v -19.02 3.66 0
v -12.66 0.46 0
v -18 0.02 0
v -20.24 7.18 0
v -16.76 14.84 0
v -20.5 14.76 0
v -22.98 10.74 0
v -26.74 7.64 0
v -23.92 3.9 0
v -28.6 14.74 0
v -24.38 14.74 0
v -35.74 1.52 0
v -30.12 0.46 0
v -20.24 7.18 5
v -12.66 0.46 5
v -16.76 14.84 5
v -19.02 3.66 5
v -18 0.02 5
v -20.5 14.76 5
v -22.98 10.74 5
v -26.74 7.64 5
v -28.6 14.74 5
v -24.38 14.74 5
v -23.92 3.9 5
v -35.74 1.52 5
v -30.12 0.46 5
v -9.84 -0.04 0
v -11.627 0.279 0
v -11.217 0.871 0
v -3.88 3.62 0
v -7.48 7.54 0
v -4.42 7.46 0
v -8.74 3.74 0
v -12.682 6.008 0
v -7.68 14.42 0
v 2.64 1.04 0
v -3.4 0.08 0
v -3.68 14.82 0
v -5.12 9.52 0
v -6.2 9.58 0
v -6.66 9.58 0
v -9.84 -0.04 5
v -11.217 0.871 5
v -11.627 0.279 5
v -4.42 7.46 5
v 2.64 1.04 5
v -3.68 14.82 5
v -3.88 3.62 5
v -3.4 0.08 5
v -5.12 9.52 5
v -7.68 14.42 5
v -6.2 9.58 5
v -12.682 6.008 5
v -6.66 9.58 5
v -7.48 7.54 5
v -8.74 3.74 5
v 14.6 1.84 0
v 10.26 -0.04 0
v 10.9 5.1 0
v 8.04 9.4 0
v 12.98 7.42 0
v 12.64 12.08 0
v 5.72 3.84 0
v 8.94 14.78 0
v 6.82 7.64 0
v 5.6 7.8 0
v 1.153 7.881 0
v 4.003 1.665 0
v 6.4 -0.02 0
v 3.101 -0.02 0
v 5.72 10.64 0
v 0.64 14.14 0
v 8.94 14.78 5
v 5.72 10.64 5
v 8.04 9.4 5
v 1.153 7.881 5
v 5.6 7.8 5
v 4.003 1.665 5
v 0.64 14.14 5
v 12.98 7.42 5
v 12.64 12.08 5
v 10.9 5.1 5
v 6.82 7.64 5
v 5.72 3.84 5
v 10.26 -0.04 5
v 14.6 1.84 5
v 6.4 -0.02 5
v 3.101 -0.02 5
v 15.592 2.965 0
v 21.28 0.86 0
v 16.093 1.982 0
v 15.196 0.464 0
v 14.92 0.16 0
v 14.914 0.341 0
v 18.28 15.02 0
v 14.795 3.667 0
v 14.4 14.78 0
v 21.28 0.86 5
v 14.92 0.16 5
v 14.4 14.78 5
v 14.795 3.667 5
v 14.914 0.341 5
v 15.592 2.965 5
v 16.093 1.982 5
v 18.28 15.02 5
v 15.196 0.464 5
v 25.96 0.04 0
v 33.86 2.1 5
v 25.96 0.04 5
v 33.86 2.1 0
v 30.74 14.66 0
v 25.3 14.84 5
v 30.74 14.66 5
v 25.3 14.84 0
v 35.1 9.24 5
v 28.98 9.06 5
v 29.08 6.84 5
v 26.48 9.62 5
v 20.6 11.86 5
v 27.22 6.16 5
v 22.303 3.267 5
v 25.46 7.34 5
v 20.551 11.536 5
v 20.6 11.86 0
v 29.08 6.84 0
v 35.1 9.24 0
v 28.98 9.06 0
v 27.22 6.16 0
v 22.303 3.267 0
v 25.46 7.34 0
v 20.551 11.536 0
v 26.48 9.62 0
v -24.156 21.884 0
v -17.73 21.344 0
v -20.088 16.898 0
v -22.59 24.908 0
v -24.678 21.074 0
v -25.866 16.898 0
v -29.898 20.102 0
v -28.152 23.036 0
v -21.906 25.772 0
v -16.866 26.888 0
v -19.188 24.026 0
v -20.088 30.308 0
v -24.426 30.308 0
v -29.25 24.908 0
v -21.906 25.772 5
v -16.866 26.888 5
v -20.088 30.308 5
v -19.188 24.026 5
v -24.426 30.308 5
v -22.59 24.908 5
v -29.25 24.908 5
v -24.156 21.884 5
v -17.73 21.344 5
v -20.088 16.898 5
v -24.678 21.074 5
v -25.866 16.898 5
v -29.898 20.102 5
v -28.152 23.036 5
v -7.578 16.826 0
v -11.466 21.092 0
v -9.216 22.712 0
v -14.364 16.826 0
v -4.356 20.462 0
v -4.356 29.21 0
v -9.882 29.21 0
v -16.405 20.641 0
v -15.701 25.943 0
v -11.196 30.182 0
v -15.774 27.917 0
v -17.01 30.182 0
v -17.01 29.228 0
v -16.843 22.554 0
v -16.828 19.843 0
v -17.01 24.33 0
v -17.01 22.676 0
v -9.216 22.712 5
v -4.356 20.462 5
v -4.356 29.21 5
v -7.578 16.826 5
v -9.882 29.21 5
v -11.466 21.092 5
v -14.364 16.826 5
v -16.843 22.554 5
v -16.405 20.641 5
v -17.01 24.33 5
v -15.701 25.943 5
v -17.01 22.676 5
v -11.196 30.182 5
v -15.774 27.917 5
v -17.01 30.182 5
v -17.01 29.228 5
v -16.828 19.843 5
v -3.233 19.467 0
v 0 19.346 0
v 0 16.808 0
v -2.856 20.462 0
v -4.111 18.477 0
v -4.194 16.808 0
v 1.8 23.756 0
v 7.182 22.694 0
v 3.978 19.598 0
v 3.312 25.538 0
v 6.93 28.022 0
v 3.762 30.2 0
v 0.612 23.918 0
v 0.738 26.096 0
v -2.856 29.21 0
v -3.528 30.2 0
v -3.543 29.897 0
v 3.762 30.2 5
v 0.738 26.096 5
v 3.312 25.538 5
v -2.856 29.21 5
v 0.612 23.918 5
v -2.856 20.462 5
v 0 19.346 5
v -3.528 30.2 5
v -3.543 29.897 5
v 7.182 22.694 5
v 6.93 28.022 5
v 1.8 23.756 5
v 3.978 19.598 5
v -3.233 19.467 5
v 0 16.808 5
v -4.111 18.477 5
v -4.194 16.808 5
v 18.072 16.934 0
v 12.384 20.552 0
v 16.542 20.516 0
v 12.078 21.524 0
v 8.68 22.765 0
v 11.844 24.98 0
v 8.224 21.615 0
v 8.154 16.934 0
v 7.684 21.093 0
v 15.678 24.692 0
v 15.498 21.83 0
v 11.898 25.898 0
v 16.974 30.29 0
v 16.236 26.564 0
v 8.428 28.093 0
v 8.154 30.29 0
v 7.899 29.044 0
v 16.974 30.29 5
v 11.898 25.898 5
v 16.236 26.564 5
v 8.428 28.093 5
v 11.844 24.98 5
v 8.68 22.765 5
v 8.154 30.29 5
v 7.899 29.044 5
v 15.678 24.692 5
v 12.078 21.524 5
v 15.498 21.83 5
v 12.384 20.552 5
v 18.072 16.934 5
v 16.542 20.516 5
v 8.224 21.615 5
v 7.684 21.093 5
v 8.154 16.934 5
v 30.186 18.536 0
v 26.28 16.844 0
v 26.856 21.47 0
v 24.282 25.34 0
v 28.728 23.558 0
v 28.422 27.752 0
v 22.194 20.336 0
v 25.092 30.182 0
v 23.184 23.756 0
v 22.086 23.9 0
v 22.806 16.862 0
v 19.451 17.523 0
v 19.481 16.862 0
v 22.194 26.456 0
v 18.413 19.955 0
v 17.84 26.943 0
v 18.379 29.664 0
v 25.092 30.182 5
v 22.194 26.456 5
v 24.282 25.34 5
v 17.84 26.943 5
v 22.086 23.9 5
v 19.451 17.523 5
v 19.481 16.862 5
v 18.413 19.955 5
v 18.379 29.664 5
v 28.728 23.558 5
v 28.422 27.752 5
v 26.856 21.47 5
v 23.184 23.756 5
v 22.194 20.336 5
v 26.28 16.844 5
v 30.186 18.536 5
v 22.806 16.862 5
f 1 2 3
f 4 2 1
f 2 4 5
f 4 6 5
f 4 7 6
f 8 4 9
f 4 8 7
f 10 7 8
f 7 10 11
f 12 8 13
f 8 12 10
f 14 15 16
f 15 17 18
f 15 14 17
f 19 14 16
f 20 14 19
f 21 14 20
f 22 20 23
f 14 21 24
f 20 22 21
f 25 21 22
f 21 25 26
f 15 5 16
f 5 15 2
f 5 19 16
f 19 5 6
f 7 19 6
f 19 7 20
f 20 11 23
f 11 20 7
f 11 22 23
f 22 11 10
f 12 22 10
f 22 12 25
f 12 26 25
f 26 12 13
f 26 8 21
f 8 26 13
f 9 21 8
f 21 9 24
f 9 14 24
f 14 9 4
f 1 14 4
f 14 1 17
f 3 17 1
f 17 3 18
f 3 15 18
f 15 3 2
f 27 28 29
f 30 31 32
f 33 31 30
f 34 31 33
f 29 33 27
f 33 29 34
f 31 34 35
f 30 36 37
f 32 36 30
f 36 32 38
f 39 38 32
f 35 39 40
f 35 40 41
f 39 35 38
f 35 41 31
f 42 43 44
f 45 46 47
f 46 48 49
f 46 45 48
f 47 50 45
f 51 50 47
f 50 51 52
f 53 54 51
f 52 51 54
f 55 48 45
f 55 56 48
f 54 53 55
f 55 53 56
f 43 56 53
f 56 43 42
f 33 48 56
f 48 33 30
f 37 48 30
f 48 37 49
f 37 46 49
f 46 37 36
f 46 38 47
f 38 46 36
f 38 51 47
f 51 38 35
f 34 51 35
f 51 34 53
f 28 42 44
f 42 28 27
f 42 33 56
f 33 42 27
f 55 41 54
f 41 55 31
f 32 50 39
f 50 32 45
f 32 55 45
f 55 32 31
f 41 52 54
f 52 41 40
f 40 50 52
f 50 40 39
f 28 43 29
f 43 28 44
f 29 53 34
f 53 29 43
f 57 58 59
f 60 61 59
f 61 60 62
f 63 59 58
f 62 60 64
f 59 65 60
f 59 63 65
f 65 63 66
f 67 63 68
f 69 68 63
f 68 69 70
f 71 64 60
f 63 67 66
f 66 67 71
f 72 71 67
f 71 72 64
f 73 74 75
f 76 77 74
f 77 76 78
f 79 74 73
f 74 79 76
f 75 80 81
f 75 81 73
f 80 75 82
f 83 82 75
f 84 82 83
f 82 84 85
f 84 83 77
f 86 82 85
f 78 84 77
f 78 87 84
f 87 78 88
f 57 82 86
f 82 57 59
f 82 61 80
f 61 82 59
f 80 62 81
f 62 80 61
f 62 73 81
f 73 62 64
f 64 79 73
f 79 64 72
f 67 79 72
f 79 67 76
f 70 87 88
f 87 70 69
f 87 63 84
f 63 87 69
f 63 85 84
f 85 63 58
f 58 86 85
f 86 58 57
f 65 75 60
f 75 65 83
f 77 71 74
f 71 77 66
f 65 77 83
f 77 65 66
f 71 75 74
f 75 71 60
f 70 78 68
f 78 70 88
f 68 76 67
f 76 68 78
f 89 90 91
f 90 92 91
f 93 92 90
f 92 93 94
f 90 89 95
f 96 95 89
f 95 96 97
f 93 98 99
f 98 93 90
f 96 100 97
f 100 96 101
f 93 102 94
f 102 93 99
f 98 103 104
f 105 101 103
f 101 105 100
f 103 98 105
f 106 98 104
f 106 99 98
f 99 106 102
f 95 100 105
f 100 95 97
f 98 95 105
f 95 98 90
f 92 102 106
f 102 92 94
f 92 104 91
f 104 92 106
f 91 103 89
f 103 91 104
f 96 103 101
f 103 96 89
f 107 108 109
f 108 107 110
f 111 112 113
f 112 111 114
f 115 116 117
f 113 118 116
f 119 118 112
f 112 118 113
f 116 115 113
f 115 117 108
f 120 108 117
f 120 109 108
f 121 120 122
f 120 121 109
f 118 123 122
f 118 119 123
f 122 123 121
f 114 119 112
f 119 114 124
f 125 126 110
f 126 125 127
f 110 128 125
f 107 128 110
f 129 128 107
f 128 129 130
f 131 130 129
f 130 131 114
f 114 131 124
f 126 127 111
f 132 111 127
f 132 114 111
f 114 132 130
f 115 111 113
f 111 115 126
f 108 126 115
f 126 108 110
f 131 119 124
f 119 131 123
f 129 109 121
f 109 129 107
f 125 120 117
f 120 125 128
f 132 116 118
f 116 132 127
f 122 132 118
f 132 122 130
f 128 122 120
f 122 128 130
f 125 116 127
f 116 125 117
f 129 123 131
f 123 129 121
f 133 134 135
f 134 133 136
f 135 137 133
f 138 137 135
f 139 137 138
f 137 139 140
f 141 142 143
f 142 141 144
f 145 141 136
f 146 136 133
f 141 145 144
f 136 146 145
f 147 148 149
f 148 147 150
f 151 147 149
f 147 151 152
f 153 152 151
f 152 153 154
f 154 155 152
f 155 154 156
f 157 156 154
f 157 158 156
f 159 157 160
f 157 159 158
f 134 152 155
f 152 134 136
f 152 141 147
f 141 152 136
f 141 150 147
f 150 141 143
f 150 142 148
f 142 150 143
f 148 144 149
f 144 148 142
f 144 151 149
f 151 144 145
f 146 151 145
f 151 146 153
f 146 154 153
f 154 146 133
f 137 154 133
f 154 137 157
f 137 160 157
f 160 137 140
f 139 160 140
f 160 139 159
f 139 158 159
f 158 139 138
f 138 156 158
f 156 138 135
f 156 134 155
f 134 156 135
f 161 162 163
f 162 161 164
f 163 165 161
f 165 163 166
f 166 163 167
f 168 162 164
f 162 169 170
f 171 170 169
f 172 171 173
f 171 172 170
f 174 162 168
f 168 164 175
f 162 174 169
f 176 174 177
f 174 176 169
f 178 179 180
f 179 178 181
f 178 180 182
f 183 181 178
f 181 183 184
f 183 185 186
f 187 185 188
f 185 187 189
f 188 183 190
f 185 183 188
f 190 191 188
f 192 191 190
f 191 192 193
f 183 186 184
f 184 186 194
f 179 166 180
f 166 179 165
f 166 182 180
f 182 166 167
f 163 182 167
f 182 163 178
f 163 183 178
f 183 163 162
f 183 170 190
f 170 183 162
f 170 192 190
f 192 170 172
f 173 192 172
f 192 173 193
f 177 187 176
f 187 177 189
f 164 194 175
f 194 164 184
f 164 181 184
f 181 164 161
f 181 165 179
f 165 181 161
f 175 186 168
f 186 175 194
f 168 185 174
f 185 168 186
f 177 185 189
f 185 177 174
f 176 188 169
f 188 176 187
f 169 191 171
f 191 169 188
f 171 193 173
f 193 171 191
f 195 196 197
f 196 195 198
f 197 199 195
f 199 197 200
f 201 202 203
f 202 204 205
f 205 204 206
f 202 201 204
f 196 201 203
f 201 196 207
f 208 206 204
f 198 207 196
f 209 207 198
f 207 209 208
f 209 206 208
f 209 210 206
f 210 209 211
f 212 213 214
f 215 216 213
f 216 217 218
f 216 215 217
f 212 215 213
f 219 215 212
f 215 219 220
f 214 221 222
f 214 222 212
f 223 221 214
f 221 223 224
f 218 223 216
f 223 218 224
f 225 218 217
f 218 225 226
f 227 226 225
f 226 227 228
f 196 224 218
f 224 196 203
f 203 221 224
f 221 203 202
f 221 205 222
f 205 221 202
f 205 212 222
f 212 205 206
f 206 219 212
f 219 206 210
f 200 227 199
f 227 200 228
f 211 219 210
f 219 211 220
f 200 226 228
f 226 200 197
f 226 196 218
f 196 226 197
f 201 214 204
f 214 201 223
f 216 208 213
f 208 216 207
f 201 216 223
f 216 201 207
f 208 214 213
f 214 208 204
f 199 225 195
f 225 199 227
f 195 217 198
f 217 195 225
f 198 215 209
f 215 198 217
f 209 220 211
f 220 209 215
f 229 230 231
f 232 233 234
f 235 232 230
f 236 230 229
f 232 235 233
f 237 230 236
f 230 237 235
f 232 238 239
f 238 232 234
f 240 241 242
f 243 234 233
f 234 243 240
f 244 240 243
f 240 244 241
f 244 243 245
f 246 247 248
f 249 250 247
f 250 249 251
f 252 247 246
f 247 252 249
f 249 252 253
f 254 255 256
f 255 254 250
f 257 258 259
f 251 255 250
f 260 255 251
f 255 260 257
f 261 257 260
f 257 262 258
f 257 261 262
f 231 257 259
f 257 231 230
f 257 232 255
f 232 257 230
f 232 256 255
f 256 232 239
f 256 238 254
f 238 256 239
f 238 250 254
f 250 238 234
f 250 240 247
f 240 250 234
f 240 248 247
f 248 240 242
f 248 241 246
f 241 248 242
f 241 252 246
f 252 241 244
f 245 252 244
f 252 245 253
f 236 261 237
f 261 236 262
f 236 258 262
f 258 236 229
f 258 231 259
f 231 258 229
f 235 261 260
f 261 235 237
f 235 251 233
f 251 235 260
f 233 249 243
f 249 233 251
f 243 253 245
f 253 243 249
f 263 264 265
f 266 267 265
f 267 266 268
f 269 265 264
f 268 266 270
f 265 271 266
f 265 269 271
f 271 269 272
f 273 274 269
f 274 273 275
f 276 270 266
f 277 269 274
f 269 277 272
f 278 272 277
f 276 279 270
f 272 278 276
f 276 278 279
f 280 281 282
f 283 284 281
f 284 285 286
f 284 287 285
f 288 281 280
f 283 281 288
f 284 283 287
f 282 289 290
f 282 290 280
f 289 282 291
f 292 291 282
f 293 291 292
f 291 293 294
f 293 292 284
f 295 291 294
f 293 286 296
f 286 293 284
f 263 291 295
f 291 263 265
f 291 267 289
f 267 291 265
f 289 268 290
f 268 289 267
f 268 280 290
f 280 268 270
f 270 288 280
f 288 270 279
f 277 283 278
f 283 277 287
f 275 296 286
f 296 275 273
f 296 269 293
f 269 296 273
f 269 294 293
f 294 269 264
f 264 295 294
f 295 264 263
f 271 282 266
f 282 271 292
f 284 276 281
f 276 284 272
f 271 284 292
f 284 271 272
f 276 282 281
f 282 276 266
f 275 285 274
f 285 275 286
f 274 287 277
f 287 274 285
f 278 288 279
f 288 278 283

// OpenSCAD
// Choose your custom words and write them in UPPERCASE.
// If you want only one line, you can leave the second word empty.
word1="SUPER";
word2="MARIO";

// CONSTANTS
// The following values are model constants and are not intended to be changed by the end user.
//-----------------
// [Fixed design parameters]
// Scale for Word 1
scale_word1 = 1.8;

// Scale for Word 2
scale_word2 = 2.0;
// Height scale
scale_height = 5;

// Brim radius/offset
brim_radius = 1.5;

// Gap between the two words
gap = 2;
// Spaziatura tra le lettere
spacing = 0.0;
// Thickness of the brim base
bottom_thickness=2;

// Small tolerance to help letters fit into the brim
wiggle=0.1;
//-----------------


// Wall thickness for hollow letters
wall_thikness_letter = 2;

//-----------------

// Path data for letters and symbols
glyph_A = [
    [449, 741], [765, 52], [463, 4], [439, 181], [196, 187], [141, -2], [-150, 50], [249, 721], [449, 741]
]/100;
glyph_B = [
    [138, 747], [485, 706], [565, 578], [559, 441], [507, 363], [580, 321], [629, 178], [573, 45], [457, 4], [21, 1], [1, 704], [138, 747]
]/100;
glyph_C = [
    [287, 744], [563, 726], [552, 461], [372, 545], [215, 472], [208, 302], [346, 208], [549, 314], [617, 35], [218, 0], [23, 171], [-35, 386], [55, 617], [287, 744]
]/100;
glyph_D = [
    [368, 744], [578, 572], [621, 171], [414, 2], [0, 2], [0, 699], [368, 744]
]/100;
glyph_E = [
    [54, 745], [544, 745], [503, 538], [262, 501], [259, 450], [472, 434], 
    [462, 275], [272, 258], [289, 204], [520, 202], [605, 3], [54, 3], 
    [0, 481], [54, 745]
]/100;
glyph_F = [
    [49, 746], [553, 742], [525, 501], [250, 532], [246, 452], [479, 464], [441, 244], [246, 269], [288, 3], [22, 3], [1, 543], [49, 746]
]/100;
glyph_G = [
    [627, 591], [456, 495], [387, 533], [285, 502], [224, 357], [288, 222], [472, 244], [476, 277], [334, 264], [352, 465], [648, 461], [648, 66], [151, 2], [0, 309], [55, 591], [267, 745], [527, 727], [627, 591]
]/100;
glyph_H = [
    [0, 698], [252, 746], [264, 441], [411, 463], [420, 732], [626, 723], [666, 5], [434, 13], [432, 238], [292, 211], [297, 5], [80, 5],
    [0, 698]
]/100;
glyph_I = [
    [5, 739], [199, 751], [349, 43], [31, 8], [5, 739]
]/100;
glyph_J = [
    [0, 739], [219, 744], [658, 724], [658, 528], [459, 509],
    [533, 162], [430, 32], [235, 0], [18, 0], [25, 220],
    [263, 237], [236, 509], [0, 528], [0, 739]
]/100;
glyph_K = [
    [14, 741], [223, 741], [218, 539], [375, 718], [518, 566],
    [337, 369], [605, 178], [440, 0], [216, 243], [257, -2],
    [0, -2], [14, 741]
]/100;
glyph_L = [
    [278, 717], [249, 269], [556, 306], [584, 75], [28, 9],
    [0, 749], [278, 717]
]/100;
glyph_M = [
    [0, 76], [357, 737], [568, 737], [638, 537], [762, 738],
    [949, 742], [1154, 23], [887, 1], [836, 183], [775, 359],
    [591, 195], [450, 382], [281, 23], [0, 76]
]/100;
glyph_N = [
    [0, 13], [133, 742], [284, 742], [425, 510], [437, 742],
    [669, 706], [620, 4], [428, 16], [280, 242], [237, 3],
    [0, 13]
]/100;
glyph_O = [
    [522, 733], [740, 462], [678, 105], [283, 2], [-32, 280],
    [15, 593], [250, 742], [522, 733]
]/100;
glyph_P = [
    [442, 740], [618, 619], [632, 323], [454, 151], [233, 137], [233, -4], [0, -4], [37, 740], [442, 740]
]/100;
glyph_Q =[
    [531, 731], [721, 478], [653, 216], [797, 84], [621, -2], [535, 61], [238, -3], [-21, 243], [26, 593], [260, 740], [531, 731]
]/100;
glyph_R = [
    [415, 739], [600, 604], [617, 371], [513, 255], [698, 92], [481, -2], [254, 192], [288, -1], [58, -1], [0, 707], [415, 739]
]/100;
glyph_S = [
    [725, 556], [596, 397], [445, 494], [407, 446], [677, 248], [546, 1], [225, 1], [1, 179], [98, 342], [291, 233],
    [320, 278], [37, 446], [305, 746], [546, 746], [725, 556]
]/100;
glyph_T = [
    [0, 742], [739, 729], [739, 429], [489, 470], [558, -1], [200, -1], [254, 470], [0, 483], [0, 742]
]/100;
glyph_U = [
    [-9, 739], [314, 739], [299, 234], [424, 324], [387, 685], [694, 685], [694, 199], [515, -3], [138, -3], [-9, 177], [-9, 739]
]/100;
glyph_V = [
    [0, 745], [259, 731], [362, 284], [401, 334], [512, 731], [799, 745], [517, 3], [169, 29], [0, 745]
]/100;
glyph_W = [
    [1028, 675], [709, 6], [523, 6], [454, 207], [352, 5], [182, 0], [0, 723], [238, 744], [283, 562], [337, 385], [502, 550], [627, 362], [778, 729], [1028, 675]
]/100;
glyph_X = [
    [200, 739], [357, 579], [473, 750], [663, 568], [525, 405], [753, 226], [563, 7], [399, 221], [191, 12], [0, 201], [221, 400], [53, 588], [200, 739]
]/100;
glyph_Y = [
    [71, 733], [236, 557], [391, 753], [610, 588], [371, 380], [548, 13], [156, 31], [156, 350], [-93, 588], [71, 733]
]/100;
glyph_Z = [
    [617, 3], [0, 28], [0, 228], [248, 486], [0, 471], [44, 748], [625, 707], [614, 517], [386, 265], [625, 300], [617, 3]
]/100;
glyph_0 = [
    [381, 732], [552, 531], [497, 90], [224, 1], [3, 223], [48, 606], [202, 742], [381, 732], [560, 732]
]/100;
glyph_1 = [
    [527, 727], [468, 205], [679, 232], [713, 1], [0, 1], [20, 218], [258, 205], [258, 476], [133, 397], [0, 578], [269, 741], [527, 741]
]/100;
glyph_2 = [
    [4, 605], [211, 742], [392, 741], [544, 629], [610, 352], [411, 221], [629, 239], [686, 1], [110, 9], [34, 156], [330, 390], [309, 454], [261, 492], [140, 409], [4, 605]
]/100;
glyph_3 = [
    [1, 607], [178, 740], [403, 708], [511, 522], [441, 421], [528, 357], [534, 131], [415, 1], [148, 26], [1, 175], [120, 291], [220, 197], [314, 222], [317, 279], [170, 329], [176, 419], [295, 498], [264, 531], [97, 454], [1, 607]
]/100;
glyph_4 = [
    [531, 409], [689, 402], [689, 223], [548, 214], [575, 31], [318, 4], [314, 214], [8, 214], [4, 400], [208, 747], [487, 728], [531, 409]
]/100;
glyph_5 = [
    [572, 741], [530, 543], [247, 546], [253, 501], [415, 495], [610, 389], [609, 166], [534, 45], [189, 10], [7, 95], [88, 248], [212, 205], [324, 200], [368, 251], [318, 298], [91, 293], [10, 433], [0, 724], [572, 741]
]/100;
glyph_6 = [
    [154, 719], [335, 746], [515, 709], [447, 499], [286, 559], [211, 500], [202, 444], [416, 438], [501, 300], [499, 120], [380, 1], [136, 1], [0, 120], [0, 371], [28, 575], [154, 719]
]/100;
glyph_7 = [
    [0, 740], [641, 726], [524, -3], [234, 66], [393, 501], [51, 473], [0, 740]
]/100;
glyph_8 = [
    [461, 716], [533, 519], [446, 450], [562, 355], [577, 61], [414, -3], [154, -3], [0, 87], [17, 351], [139, 444], [46, 519], [116, 745], [461, 716]
]/100;
glyph_9 = [
    [306, 747], [533, 593], [524, 320], [447, 127], [116, 1], [0, 161], [264, 230], [319, 327], [137, 313], [0, 463], [36, 677], [306, 747]
]/100;
glyph_at = [
    [422, 103], [606, 184], [657, 125], [441, 2], [160, 63], [3, 349], [116, 715], [381, 854], [786, 684], [869, 344], [800, 248], [744, 167], [636, 182], [594, 233], [461, 169], [234, 206], [183, 482], [323, 672], [510, 664], [596, 607], [599, 637], [670, 600], [653, 418], [677, 260], [722, 243], [783, 364], [710, 615], [385, 748], [197, 637], [119, 371], [212, 165], [422, 103]
]/100;
glyph_b_l = [
    [233, 856], [241, 782], [89, 795], [84, -15], [241, 15], [241, -83], [7, -98], [2, 866], [233, 856]
]/100;
glyph_b_r = [
    [9, -88], [1, -14], [153, -27], [158, 783], [1, 753], [1, 851], [235, 866], [240, -98], [9, -88]
]/100;
glyph_per = [
    [389, 745], [572, 774], [206, 33], [0, 4], [389, 745], [475, 293], [544, 213], [522, 35], [412, 0], [324, 88], [342, 242], [404, 297], [475, 293], [389, 745], [191, 768], [260, 687], [238, 510], [128, 474], [38, 564], [57, 717], [119, 771], [191, 768], [389, 745]
]/100;
glyph_num = [
    [395, 778], [292, 29], [156, 0], [274, 749], [395, 778],
    
    [544, 749], [665, 778], [563, 29], [426, 0], [544, 749], 
    
   [718, 601], [810, 451], [113, 429], [4, 594], [718, 601],  
    
    [733, 328], [832, 169], [135, 147], [60, 316], [733, 328], [718, 601], [544, 749], [395, 778]
]/100;
glyph_dol = [
    [664, 550], [546, 405], [431, 528], [289, 576], [254, 531], [664, 256], [500, 42], [206, 42], [1, 205], [90, 354], [259, 208], [444, 163], [471, 204], [34, 450], [279, 724], [500, 724], 
    [424, 794], [341, 795], [283, -32], [399, -20], [424, 794], [500, 724]
]/100;
glyph_asc = [
    [278, 582], [164, 765], [68, 601], [8, 638], [164, 882], [348, 593], [278, 582]
]/100;
glyph_bar = [
    [60, -121], [5, -121], [3, 853], [58, 853], [60, 974], [115, 974], [60, -121]
]/100;
glyph_ast = [
    [67, 719], [97, 720], [93, 653], [144, 696], [158, 662], [99, 638], [161, 608], [141, 585], [93, 620], [99, 558], [49, 561], [55, 620], [22, 617], [28, 676], [78, 640], [28, 699], [95, 673], [95, 730], [45, 694], [23, 722], [90, 748], [38, 784], [67, 719]
]/100;
glyph_col = [
    [92, 179], [164, 144], [172, 49], [114, 8], [50, 20], [20, 52], [10, 136], [92, 179], [97, 320], [170, 386], [167, 456], [84, 503], [16, 463], [22, 362], [97, 320]
]/100;
//glyph_scol = [
    //[72, 456], [139, 496], [220, 450], [223, 381], [154, 317], [81, 358], [89, 95], [164, 91], [142, -17], [61, -92], [11, -92], [80, 5]
//]/100;
glyph_dot = [
    [107, 173], [186, 173], [233, 91], [200, 30], [107, 9], [64, 82], [107, 173]
]/100;
glyph_sl = [
    [375, 727], [551, 755], [198, 41], [0, 13], [375, 727]
]/100;
glyph_add = [
    [222, 524], [220, 424], [323, 434], [336, 320], [220, 325], [233, 221], [125, 213], [116, 325], [15, 328], [-2, 423], [119, 423], [108, 529], [222, 524]
]/100;
glyph_com = [
    [58, 81], [138, 76], [114, -39], [28, -119], [-25, -119], [48, -15], [58, 81]
]/100;
glyph_dif = [
    [6, 342], [1, 431], [325, 471], [341, 354], [6, 342]
]/100;
glyph_equ = [
    [5, 299], [0, 353], [305, 377], [320, 307], [5, 299], [5, 435], [0, 488], [305, 512], [320, 442], [5, 435]
]/100;
glyph_que = [
    [242, 144], [298, 68], [263, 3], [174, 0], [138, 54], [162, 140], [242, 144],
    [256, 465], [284, 573], [226, 609], [138, 528], [0, 671], [131, 779], [308, 779], [437, 623], [432, 424], [293, 330], [308, 190], [126, 190], [105, 345], [256, 465], [242, 144]
]/100;
glyph_exc = [
    [213, 219], [93, 210], [0, 768], [197, 796], [213, 219],[71, 78], [106, 144], [197, 148], [233, 92], [209, 4], [128, 1], [71, 78]
]/100;
glyph_les = [
    [37, 785], [91, 776], [91, 665], [38, 593], [-3, 609], [38, 691], [205, 776], [205, 665], [152, 593], [99, 609], [140, 691], [139, 785],
    [205, 776], [205, 665], [152, 593], [99, 609], [140, 691], [139, 785]
]/100;
glyph_pr = [
    [0, 785], [71, 785], [175, 658], [251, 402], [240, 130], [200, 2], [80, -100], [33, -80], [120, 41], [150, 268], [119, 498], [0, 785]
]/100;
glyph_pl = [
    [250, 780], [132, 622], [67, 392], [92, 166], [218, -62], [130, -62], [80, 40], [20, 194], [0, 465], [76, 721], [120, 800], [220, 860], [354, 890], [354, 800]
]/100;
glyph_uns = [
    [0, -28], [0, 27], [728, 27], [728, -28], [0, -28]
]/100;
glyph_qus = [
    [37, 785], [91, 776], [91, 665], [38, 593], [-3, 609], [38, 691], [37, 785]
]/100;
// Path data for the holes in the letters and symbols
hole_A = [
    [300, 479], [259, 377], [412, 373], [377, 476], [323, 479]
]/100;
hole_B = [
    [257, 152], [359, 174], [359, 242], [257, 277], [257, 152], [244, 462], [345, 483], [345, 565], [244, 587], [244, 462]
]/100;
hole_D = [
    [229, 477], [229, 259], [364, 306], [364, 415], [229, 477]
]/100;
hole_O = [
    [309, 481], [258, 367], [346, 308], [439, 342], [434, 453], [309, 481]
]/100;
hole_P = [
    [274, 512], [267, 391], [333, 382], [417, 481], [274, 512]
]/100;
hole_Q = [
    [228, 477], [221, 272], [385, 223], [294, 313], [426, 409], [505, 336], [532, 388], [432, 523], [228, 477]
]/100;
hole_R = [
    [254, 532], [248, 390], [309, 382], [370, 470], [254, 532]
]/100;
hole_0 = [
    [257, 488], [235, 324], [279, 287], [327, 321], [318, 462], [257, 462]

]/100;
hole_4 = [
    [216, 409], [305, 409], [297, 513], [216, 409]
]/100;
hole_6 = [
    [258, 267], [211, 244], [213, 185], [292, 185], [308, 249], [258, 267]
]/100;
hole_8 = [
    [364, 259], [306, 283], [248, 259], [248, 211], [306, 187], [364, 211], [364, 259], [332, 587], [288, 605], [244, 587], [244, 551], [288, 533], [332, 551], [332, 587]
]/100;
hole_9 = [
    [225, 480], [312, 480], [321, 527], [281, 560], [225, 527], [225, 480]
]/100;
hole_at = [
    [381, 514], [336, 445], [365, 351], [451, 351], [508, 418], [479, 504], [381, 514]
]/100;
hole_per = [
    [426, 195], [417, 129], [435, 114], [454, 128], [451, 185], [426, 195],
    [141, 670], [132, 604], [149, 589], [169, 603], [165, 659], [141, 670]
]/100;
// Width of the letters
width = [765-100/*A*/, 629-1/*B*/, 617+35/*C*/, 621-0/*D*/, 605-25/*E*/, 553-1/*F*/, 648-0/*G*/, 666-0/*H*/, 350-50/*I*/, 658-0/*J*/, 540-0/*K*/, 584-0/*L*/, 1154-0/*M*/, 669-0/*N*/, 740+32/*O*/, 632-0/*P*/, 797+21/*Q*/, 698-15/*R*/, 725+1/*S*/, 739-0/*T*/, 694+9/*U*/, 799-0/*V*/, 1028-0/*W*/, 753-0/*X*/, 610+93/*Y*/, 625-0/*Z*/, 560-3/*0*/, 620/*1*/, 686-4/*2*/, 600/*3*/, 689-4/*4*/, 680/*5*/, 515/*6*/, 641/*7*/, 577/*8*/, 533/*9*/, 869/*@*/, 240/*[*/, 240/*]*/, 572/*%*/, 572/*#*/, 664/*$*/, 348/*^*/, 115/*|*/, 161/***/, 172+79/*:*/, 220/*;*/, 270/*.*/, 551/*/*/, 336/*+*/, 160/*,*/, 330/*-*/, 310/*=*/, 430/*?*/, 230/*!*/, 882/*<*/, 251/*)*/, 354/*(*/, 728/*_*/, 90/*'*/]/100;
width_A = width[0];
width_B = width[1];
width_C = width[2];
width_D = width[3];
width_E = width[4];
width_F = width[5];
width_G = width[6];
width_H = width[7];
width_I = width[8];
width_J = width[9];
width_K = width[10];
width_L = width[11];
width_M = width[12];
width_N = width[13];
width_O = width[14];
width_P = width[15];
width_Q = width[16];
width_R = width[17];
width_S = width[18];
width_T = width[19];
width_U = width[20];
width_V = width[21];
width_W = width[22];
width_X = width[23];
width_Y = width[24];
width_Z = width[25];
width_0 = width[26];
width_1 = width[27];
width_2 = width[28];
width_3 = width[29];
width_4 = width[30];
width_5 = width[31];
width_6 = width[32];
width_7 = width[33];
width_8 = width[34];
width_9 = width[35];
width_at = width[36];
width_b_l = width[37];
width_b_r = width[38];
width_per = width[39];
width_num = width[40];
width_dol = width[41];
width_asc = width[42];
width_bar = width[43];
width_ast = width[44];
width_col = width[45];
width_scol = width[46];
width_dot = width[47];
width_sl = width[48];
width_add = width[49];
width_com = width[50];
width_dif = width[51];
width_equ = width[52];
width_que = width[53];
width_exc = width[54];
width_les = width[55];
width_pr = width[56];
width_pl = width[57];
width_uns = width[58];
width_qus = width[59];
// Function that returns the path data for any supported letter or symbol
function glyph_sorter_all(letter) =
    letter == "A" ? (glyph_A) :
    letter == "B" ? (glyph_B) :
    letter == "C" ? (glyph_C) :
    letter == "D" ? (glyph_D) :
    letter == "E" ? (glyph_E) :
    letter == "F" ? (glyph_F) :
    letter == "G" ? (glyph_G) :
    letter == "H" ? (glyph_H) :
    letter == "I" ? (glyph_I) :
    letter == "J" ? (glyph_J) :
    letter == "K" ? (glyph_K) :
    letter == "L" ? (glyph_L) :
    letter == "M" ? (glyph_M) :
    letter == "N" ? (glyph_N) :
    letter == "O" ? (glyph_O) :
    letter == "P" ? (glyph_P) :
    letter == "Q" ? (glyph_Q) :
    letter == "R" ? (glyph_R) :
    letter == "S" ? (glyph_S) :
    letter == "T" ? (glyph_T) :
    letter == "U" ? (glyph_U) :
    letter == "V" ? (glyph_V) :
    letter == "W" ? (glyph_W) :
    letter == "X" ? (glyph_X) :
    letter == "Y" ? (glyph_Y) :
    letter == "Z" ? (glyph_Z) :
    letter == "0" ? (glyph_0) :
    letter == "1" ? (glyph_1) :
    letter == "2" ? (glyph_2) :
    letter == "3" ? (glyph_3) :
    letter == "4" ? (glyph_4) :
    letter == "5" ? (glyph_5) :
    letter == "6" ? (glyph_6) :
    letter == "7" ? (glyph_7) :
    letter == "8" ? (glyph_8) :
    letter == "9" ? (glyph_9) :
    letter == "@" ? (glyph_at) :
    letter == "[" ? (glyph_b_l) :
    letter == "]" ? (glyph_b_r) :
    letter == "%" ? (glyph_per) :
    letter == "#" ? (glyph_num) :
    letter == "$" ? (glyph_dol) :
    letter == "^" ? (glyph_asc) :
    letter == "|" ? (glyph_bar) :
    letter == "*" ? (glyph_ast) :
    letter == ":" ? (glyph_col) :
    letter == ";" ? (glyph_scol) :
    letter == "." ? (glyph_dot) :
    letter == "/" ? (glyph_sl) :
    letter == "+" ? (glyph_add) :
    letter == "," ? (glyph_com) :
    letter == "-" ? (glyph_dif) :
    letter == "=" ? (glyph_equ) :
    letter == "?" ? (glyph_que) :
    letter == "!" ? (glyph_exc) :
    letter == "<" ? (glyph_les) :
    letter == ")" ? (glyph_pr) :
    letter == "(" ? (glyph_pl) :
    letter == "_" ? (glyph_uns) :
    letter == "'" ? (glyph_qus) :
    0; // Default value for unsupported letters

// Function that returns the path data for a subset of letters/symbols (used for solid letters)
function glyph_sorter(letter) =
    letter == "C" ? (glyph_C) :
    letter == "E" ? (glyph_E) :
    letter == "F" ? (glyph_F) :
    letter == "G" ? (glyph_G) :
    letter == "H" ? (glyph_H) :
    letter == "I" ? (glyph_I) :
    letter == "J" ? (glyph_J) :
    letter == "K" ? (glyph_K) :
    letter == "L" ? (glyph_L) :
    letter == "M" ? (glyph_M) :
    letter == "N" ? (glyph_N) :
    letter == "S" ? (glyph_S) :
    letter == "T" ? (glyph_T) :
    letter == "U" ? (glyph_U) :
    letter == "V" ? (glyph_V) :
    letter == "W" ? (glyph_W) :
    letter == "X" ? (glyph_X) :
    letter == "Y" ? (glyph_Y) :
    letter == "Z" ? (glyph_Z) :
    letter == "1" ? (glyph_1) :
    letter == "2" ? (glyph_2) :
    letter == "3" ? (glyph_3) :
    letter == "5" ? (glyph_5) :
    letter == "7" ? (glyph_7) :
    letter == "[" ? (glyph_b_l) :
    letter == "]" ? (glyph_b_r) :
    letter == "#" ? (glyph_num) :
    letter == "$" ? (glyph_dol) :
    letter == "^" ? (glyph_asc) :
    letter == "|" ? (glyph_bar) :
    letter == "*" ? (glyph_ast) :
    letter == ":" ? (glyph_col) :
    letter == ";" ? (glyph_scol) :
    letter == "." ? (glyph_dot) :
    letter == "/" ? (glyph_sl) :
    letter == "+" ? (glyph_add) :
    letter == "," ? (glyph_com) :
    letter == "-" ? (glyph_dif) :
    letter == "=" ? (glyph_equ) :
    letter == "?" ? (glyph_que) :
    letter == "!" ? (glyph_exc) :
    letter == "<" ? (glyph_les) :
    letter == ")" ? (glyph_pr) :
    letter == "(" ? (glyph_pl) :
    letter == "_" ? (glyph_uns) :
    letter == "'" ? (glyph_qus) :
    0; // Default value for unsupported letters

// Function that returns the path data for letters with holes (used for hollow or outlined letters
function glyph_sorter_hole(letter) =
    letter == "A" ? (glyph_A) :
    letter == "B" ? (glyph_B) :
    letter == "D" ? (glyph_D) :
    letter == "O" ? (glyph_O) :
    letter == "P" ? (glyph_P) :
    letter == "Q" ? (glyph_Q) :
    letter == "R" ? (glyph_R) :
    letter == "0" ? (glyph_0) :
    letter == "4" ? (glyph_4) :
    letter == "6" ? (glyph_6) :
    letter == "8" ? (glyph_8) :
    letter == "9" ? (glyph_9) :
    letter == "@" ? (glyph_at) :
    letter == "%" ? (glyph_per) :
    0; // Default value for unsupported letters

// Function that returns the path data for the hole inside a letter (if present)
function hole_sorter(letter) =
    letter == "A" ? (hole_A) :
    letter == "B" ? (hole_B) :
    letter == "D" ? (hole_D) :
    letter == "O" ? (hole_O) :
    letter == "P" ? (hole_P) :
    letter == "Q" ? (hole_Q) :
    letter == "R" ? (hole_R) :
    letter == "0" ? (hole_0) :
    letter == "4" ? (hole_4) :
    letter == "6" ? (hole_6) :
    letter == "8" ? (hole_8) :
    letter == "9" ? (hole_9) :
    letter == "@" ? (hole_at) :
    letter == "%" ? (hole_per) :
    0;  // Default value for unsupported letters

// Function that returns the width of a letter or symbol, used for spacing
function width_letter(letter) =
    letter == "A" ? (width_A) :
    letter == "B" ? (width_B) :
    letter == "C" ? (width_C) :
    letter == "D" ? (width_D) :
    letter == "E" ? (width_E) :
    letter == "F" ? (width_F) :
    letter == "G" ? (width_G) :
    letter == "H" ? (width_H) :
    letter == "I" ? (width_I) :
    letter == "J" ? (width_J) :
    letter == "K" ? (width_K) :
    letter == "L" ? (width_L) :
    letter == "M" ? (width_M) :
    letter == "N" ? (width_N) :
    letter == "O" ? (width_O) :
    letter == "P" ? (width_P) :
    letter == "Q" ? (width_Q) :
    letter == "R" ? (width_R) :
    letter == "S" ? (width_S) :
    letter == "T" ? (width_T) :
    letter == "U" ? (width_U) :
    letter == "V" ? (width_V) :
    letter == "W" ? (width_W) :
    letter == "X" ? (width_X) :
    letter == "Y" ? (width_Y) :
    letter == "Z" ? (width_Z) :
    letter == "0" ? (width_0) :
    letter == "1" ? (width_1) :
    letter == "2" ? (width_2) :
    letter == "3" ? (width_3) :
    letter == "4" ? (width_4) :
    letter == "5" ? (width_5) :
    letter == "6" ? (width_6) :
    letter == "7" ? (width_7) :
    letter == "8" ? (width_8) :
    letter == "9" ? (width_9) :
    letter == "@" ? (width_at) :
    letter == "[" ? (width_b_l) :
    letter == "]" ? (width_b_r) :
    letter == "%" ? (width_per) :
    letter == "#" ? (width_num) :
    letter == "$" ? (width_dol) :
    letter == "^" ? (width_asc) :
    letter == "|" ? (width_bar) :
    letter == "*" ? (width_ast) :
    letter == ":" ? (width_col) :
    letter == ";" ? (width_scol) :
    letter == "." ? (width_dot) :
    letter == "/" ? (width_sl) :
    letter == "+" ? (width_add) :
    letter == "," ? (width_com) :
    letter == "-" ? (width_dif) :
    letter == "=" ? (width_equ) :
    letter == "?" ? (width_que) :
    letter == "!" ? (width_exc) :
    letter == "<" ? (width_les) :
    letter == ")" ? (glyph_pr) :
    letter == "(" ? (glyph_pl) :
    letter == "_" ? (glyph_uns) :
    letter == "'" ? (glyph_qus) :
    0; // Default value for unsupported letters

// Module that draws a glyph as a 2D polygon and extrudes it to the given height
module draw_glyph(paths, height=1)
{
    linear_extrude(height)
    polygon(paths); 
 

}

// Module that draws a glyph with a negative offset for hollow letters
module draw_glyph_smaller(paths, height=1)
{
    linear_extrude(height) offset(-wall_thikness_letter)
    polygon(paths);
}
// These Moduls are used to draw the brim around the letters, interlocking
// Module that draws the brim (outline) of a glyph with brim_radius
module draw_glyph_brim(paths, height=1)
{
     linear_extrude(height) offset(brim_radius) polygon(paths); // Dickerer Umriss am unteren Ende
}
// Module that draws a larger brim for hollow letters
module draw_glyph_brim_bigger(paths, height=1)
{
     linear_extrude(height) offset(brim_radius + wall_thikness_letter) polygon(paths); // Dickerer Umriss am unteren Ende
}

// Module that renders both words, positioning them correctly
module call_words(brim, k)
{   // Render the second word, centered horizontally
    translate([-total_width(word2, scale_word2) / 2, 0, 0])
    {
        render_word(word2, scale_height, scale_word2, k, brim);
    }
    // Render the first word, centered horizontally and shifted vertically
    translate([-total_width(word1, scale_word1) / 2, 7.44 * scale_word2 + gap, 0])
    {
        render_word(word1, scale_height, scale_word1, k, brim);
    }
}

// Module is necessary to renderer the letters to interlock them
// Module that renders a single letter with all options (brim, hollow, holes, etc.)
module render_letter(letter, height, i, pre_letter, scale, k, brim)
{
        // If the letter has a hole (A, B, D, O, P, Q, R, 0, 4, 6, 8, 9, @, %), draw the brim and the hole

        if(letter == "A"||"B"||"D"||"O"||"P"||"Q"||"R"||"0"||"4"||"6"||"8"||"9"||"@"||"%")
    {
        draw_glyph_brim(glyph_sorter_hole(letter)*scale, brim);
        difference()
        {
            draw_glyph(glyph_sorter_hole(letter)*scale, height);
            translate([0, 0, -1]) draw_glyph(hole_sorter(letter)*scale, height + 2);// Loch
            translate([-width_letter(pre_letter)*scale, 0, 0])draw_glyph_brim(glyph_sorter_all(pre_letter)*scale, height+2);
        }
    }
    // Draw the brim and the letter for all other cases

    draw_glyph_brim(glyph_sorter(letter)*scale,brim);
    difference()
    {
        draw_glyph(glyph_sorter(letter)*scale, height);
        translate([-width_letter(pre_letter)*scale-spacing, 0, 0])draw_glyph_brim(glyph_sorter_all(pre_letter)*scale, height+2);
    }

}



// Module that renders a word, letter by letter, with correct spacing
module render_word(word, height=1, scale, k, brim)
{ 
    // Loop through each letter in the word and render it with the correct spacing

    for (i = [0 : len(word) - 1])
    {
        translate([spacing_letter(i, str(word[i]), word, scale), 0, 0])
        {
            render_letter(str(word[i]), height, i, i == 0 ? "" : str(word[i-1]), scale, k, brim);
        }
    }
}

// Function that calculates the X offset for each letter in a word

function spacing_letter(i, letter, word, scale)
= i == 0 ? 0 : spacing_letter(i-1, str(word[i-1]), word, scale) + width_letter(str(word[i-1])) * scale + spacing;

// Function that calculates the total width of a word
function total_width(word, scale) = spacing_letter(len(word)-1, str(word[len(word)-1]), word, scale) + width_letter(str(word[len(word)-1])) * scale;

// Main module to render both words
module main() 
{
    // Call the words with the specified parameters
    call_words(0, false);

}

main();
